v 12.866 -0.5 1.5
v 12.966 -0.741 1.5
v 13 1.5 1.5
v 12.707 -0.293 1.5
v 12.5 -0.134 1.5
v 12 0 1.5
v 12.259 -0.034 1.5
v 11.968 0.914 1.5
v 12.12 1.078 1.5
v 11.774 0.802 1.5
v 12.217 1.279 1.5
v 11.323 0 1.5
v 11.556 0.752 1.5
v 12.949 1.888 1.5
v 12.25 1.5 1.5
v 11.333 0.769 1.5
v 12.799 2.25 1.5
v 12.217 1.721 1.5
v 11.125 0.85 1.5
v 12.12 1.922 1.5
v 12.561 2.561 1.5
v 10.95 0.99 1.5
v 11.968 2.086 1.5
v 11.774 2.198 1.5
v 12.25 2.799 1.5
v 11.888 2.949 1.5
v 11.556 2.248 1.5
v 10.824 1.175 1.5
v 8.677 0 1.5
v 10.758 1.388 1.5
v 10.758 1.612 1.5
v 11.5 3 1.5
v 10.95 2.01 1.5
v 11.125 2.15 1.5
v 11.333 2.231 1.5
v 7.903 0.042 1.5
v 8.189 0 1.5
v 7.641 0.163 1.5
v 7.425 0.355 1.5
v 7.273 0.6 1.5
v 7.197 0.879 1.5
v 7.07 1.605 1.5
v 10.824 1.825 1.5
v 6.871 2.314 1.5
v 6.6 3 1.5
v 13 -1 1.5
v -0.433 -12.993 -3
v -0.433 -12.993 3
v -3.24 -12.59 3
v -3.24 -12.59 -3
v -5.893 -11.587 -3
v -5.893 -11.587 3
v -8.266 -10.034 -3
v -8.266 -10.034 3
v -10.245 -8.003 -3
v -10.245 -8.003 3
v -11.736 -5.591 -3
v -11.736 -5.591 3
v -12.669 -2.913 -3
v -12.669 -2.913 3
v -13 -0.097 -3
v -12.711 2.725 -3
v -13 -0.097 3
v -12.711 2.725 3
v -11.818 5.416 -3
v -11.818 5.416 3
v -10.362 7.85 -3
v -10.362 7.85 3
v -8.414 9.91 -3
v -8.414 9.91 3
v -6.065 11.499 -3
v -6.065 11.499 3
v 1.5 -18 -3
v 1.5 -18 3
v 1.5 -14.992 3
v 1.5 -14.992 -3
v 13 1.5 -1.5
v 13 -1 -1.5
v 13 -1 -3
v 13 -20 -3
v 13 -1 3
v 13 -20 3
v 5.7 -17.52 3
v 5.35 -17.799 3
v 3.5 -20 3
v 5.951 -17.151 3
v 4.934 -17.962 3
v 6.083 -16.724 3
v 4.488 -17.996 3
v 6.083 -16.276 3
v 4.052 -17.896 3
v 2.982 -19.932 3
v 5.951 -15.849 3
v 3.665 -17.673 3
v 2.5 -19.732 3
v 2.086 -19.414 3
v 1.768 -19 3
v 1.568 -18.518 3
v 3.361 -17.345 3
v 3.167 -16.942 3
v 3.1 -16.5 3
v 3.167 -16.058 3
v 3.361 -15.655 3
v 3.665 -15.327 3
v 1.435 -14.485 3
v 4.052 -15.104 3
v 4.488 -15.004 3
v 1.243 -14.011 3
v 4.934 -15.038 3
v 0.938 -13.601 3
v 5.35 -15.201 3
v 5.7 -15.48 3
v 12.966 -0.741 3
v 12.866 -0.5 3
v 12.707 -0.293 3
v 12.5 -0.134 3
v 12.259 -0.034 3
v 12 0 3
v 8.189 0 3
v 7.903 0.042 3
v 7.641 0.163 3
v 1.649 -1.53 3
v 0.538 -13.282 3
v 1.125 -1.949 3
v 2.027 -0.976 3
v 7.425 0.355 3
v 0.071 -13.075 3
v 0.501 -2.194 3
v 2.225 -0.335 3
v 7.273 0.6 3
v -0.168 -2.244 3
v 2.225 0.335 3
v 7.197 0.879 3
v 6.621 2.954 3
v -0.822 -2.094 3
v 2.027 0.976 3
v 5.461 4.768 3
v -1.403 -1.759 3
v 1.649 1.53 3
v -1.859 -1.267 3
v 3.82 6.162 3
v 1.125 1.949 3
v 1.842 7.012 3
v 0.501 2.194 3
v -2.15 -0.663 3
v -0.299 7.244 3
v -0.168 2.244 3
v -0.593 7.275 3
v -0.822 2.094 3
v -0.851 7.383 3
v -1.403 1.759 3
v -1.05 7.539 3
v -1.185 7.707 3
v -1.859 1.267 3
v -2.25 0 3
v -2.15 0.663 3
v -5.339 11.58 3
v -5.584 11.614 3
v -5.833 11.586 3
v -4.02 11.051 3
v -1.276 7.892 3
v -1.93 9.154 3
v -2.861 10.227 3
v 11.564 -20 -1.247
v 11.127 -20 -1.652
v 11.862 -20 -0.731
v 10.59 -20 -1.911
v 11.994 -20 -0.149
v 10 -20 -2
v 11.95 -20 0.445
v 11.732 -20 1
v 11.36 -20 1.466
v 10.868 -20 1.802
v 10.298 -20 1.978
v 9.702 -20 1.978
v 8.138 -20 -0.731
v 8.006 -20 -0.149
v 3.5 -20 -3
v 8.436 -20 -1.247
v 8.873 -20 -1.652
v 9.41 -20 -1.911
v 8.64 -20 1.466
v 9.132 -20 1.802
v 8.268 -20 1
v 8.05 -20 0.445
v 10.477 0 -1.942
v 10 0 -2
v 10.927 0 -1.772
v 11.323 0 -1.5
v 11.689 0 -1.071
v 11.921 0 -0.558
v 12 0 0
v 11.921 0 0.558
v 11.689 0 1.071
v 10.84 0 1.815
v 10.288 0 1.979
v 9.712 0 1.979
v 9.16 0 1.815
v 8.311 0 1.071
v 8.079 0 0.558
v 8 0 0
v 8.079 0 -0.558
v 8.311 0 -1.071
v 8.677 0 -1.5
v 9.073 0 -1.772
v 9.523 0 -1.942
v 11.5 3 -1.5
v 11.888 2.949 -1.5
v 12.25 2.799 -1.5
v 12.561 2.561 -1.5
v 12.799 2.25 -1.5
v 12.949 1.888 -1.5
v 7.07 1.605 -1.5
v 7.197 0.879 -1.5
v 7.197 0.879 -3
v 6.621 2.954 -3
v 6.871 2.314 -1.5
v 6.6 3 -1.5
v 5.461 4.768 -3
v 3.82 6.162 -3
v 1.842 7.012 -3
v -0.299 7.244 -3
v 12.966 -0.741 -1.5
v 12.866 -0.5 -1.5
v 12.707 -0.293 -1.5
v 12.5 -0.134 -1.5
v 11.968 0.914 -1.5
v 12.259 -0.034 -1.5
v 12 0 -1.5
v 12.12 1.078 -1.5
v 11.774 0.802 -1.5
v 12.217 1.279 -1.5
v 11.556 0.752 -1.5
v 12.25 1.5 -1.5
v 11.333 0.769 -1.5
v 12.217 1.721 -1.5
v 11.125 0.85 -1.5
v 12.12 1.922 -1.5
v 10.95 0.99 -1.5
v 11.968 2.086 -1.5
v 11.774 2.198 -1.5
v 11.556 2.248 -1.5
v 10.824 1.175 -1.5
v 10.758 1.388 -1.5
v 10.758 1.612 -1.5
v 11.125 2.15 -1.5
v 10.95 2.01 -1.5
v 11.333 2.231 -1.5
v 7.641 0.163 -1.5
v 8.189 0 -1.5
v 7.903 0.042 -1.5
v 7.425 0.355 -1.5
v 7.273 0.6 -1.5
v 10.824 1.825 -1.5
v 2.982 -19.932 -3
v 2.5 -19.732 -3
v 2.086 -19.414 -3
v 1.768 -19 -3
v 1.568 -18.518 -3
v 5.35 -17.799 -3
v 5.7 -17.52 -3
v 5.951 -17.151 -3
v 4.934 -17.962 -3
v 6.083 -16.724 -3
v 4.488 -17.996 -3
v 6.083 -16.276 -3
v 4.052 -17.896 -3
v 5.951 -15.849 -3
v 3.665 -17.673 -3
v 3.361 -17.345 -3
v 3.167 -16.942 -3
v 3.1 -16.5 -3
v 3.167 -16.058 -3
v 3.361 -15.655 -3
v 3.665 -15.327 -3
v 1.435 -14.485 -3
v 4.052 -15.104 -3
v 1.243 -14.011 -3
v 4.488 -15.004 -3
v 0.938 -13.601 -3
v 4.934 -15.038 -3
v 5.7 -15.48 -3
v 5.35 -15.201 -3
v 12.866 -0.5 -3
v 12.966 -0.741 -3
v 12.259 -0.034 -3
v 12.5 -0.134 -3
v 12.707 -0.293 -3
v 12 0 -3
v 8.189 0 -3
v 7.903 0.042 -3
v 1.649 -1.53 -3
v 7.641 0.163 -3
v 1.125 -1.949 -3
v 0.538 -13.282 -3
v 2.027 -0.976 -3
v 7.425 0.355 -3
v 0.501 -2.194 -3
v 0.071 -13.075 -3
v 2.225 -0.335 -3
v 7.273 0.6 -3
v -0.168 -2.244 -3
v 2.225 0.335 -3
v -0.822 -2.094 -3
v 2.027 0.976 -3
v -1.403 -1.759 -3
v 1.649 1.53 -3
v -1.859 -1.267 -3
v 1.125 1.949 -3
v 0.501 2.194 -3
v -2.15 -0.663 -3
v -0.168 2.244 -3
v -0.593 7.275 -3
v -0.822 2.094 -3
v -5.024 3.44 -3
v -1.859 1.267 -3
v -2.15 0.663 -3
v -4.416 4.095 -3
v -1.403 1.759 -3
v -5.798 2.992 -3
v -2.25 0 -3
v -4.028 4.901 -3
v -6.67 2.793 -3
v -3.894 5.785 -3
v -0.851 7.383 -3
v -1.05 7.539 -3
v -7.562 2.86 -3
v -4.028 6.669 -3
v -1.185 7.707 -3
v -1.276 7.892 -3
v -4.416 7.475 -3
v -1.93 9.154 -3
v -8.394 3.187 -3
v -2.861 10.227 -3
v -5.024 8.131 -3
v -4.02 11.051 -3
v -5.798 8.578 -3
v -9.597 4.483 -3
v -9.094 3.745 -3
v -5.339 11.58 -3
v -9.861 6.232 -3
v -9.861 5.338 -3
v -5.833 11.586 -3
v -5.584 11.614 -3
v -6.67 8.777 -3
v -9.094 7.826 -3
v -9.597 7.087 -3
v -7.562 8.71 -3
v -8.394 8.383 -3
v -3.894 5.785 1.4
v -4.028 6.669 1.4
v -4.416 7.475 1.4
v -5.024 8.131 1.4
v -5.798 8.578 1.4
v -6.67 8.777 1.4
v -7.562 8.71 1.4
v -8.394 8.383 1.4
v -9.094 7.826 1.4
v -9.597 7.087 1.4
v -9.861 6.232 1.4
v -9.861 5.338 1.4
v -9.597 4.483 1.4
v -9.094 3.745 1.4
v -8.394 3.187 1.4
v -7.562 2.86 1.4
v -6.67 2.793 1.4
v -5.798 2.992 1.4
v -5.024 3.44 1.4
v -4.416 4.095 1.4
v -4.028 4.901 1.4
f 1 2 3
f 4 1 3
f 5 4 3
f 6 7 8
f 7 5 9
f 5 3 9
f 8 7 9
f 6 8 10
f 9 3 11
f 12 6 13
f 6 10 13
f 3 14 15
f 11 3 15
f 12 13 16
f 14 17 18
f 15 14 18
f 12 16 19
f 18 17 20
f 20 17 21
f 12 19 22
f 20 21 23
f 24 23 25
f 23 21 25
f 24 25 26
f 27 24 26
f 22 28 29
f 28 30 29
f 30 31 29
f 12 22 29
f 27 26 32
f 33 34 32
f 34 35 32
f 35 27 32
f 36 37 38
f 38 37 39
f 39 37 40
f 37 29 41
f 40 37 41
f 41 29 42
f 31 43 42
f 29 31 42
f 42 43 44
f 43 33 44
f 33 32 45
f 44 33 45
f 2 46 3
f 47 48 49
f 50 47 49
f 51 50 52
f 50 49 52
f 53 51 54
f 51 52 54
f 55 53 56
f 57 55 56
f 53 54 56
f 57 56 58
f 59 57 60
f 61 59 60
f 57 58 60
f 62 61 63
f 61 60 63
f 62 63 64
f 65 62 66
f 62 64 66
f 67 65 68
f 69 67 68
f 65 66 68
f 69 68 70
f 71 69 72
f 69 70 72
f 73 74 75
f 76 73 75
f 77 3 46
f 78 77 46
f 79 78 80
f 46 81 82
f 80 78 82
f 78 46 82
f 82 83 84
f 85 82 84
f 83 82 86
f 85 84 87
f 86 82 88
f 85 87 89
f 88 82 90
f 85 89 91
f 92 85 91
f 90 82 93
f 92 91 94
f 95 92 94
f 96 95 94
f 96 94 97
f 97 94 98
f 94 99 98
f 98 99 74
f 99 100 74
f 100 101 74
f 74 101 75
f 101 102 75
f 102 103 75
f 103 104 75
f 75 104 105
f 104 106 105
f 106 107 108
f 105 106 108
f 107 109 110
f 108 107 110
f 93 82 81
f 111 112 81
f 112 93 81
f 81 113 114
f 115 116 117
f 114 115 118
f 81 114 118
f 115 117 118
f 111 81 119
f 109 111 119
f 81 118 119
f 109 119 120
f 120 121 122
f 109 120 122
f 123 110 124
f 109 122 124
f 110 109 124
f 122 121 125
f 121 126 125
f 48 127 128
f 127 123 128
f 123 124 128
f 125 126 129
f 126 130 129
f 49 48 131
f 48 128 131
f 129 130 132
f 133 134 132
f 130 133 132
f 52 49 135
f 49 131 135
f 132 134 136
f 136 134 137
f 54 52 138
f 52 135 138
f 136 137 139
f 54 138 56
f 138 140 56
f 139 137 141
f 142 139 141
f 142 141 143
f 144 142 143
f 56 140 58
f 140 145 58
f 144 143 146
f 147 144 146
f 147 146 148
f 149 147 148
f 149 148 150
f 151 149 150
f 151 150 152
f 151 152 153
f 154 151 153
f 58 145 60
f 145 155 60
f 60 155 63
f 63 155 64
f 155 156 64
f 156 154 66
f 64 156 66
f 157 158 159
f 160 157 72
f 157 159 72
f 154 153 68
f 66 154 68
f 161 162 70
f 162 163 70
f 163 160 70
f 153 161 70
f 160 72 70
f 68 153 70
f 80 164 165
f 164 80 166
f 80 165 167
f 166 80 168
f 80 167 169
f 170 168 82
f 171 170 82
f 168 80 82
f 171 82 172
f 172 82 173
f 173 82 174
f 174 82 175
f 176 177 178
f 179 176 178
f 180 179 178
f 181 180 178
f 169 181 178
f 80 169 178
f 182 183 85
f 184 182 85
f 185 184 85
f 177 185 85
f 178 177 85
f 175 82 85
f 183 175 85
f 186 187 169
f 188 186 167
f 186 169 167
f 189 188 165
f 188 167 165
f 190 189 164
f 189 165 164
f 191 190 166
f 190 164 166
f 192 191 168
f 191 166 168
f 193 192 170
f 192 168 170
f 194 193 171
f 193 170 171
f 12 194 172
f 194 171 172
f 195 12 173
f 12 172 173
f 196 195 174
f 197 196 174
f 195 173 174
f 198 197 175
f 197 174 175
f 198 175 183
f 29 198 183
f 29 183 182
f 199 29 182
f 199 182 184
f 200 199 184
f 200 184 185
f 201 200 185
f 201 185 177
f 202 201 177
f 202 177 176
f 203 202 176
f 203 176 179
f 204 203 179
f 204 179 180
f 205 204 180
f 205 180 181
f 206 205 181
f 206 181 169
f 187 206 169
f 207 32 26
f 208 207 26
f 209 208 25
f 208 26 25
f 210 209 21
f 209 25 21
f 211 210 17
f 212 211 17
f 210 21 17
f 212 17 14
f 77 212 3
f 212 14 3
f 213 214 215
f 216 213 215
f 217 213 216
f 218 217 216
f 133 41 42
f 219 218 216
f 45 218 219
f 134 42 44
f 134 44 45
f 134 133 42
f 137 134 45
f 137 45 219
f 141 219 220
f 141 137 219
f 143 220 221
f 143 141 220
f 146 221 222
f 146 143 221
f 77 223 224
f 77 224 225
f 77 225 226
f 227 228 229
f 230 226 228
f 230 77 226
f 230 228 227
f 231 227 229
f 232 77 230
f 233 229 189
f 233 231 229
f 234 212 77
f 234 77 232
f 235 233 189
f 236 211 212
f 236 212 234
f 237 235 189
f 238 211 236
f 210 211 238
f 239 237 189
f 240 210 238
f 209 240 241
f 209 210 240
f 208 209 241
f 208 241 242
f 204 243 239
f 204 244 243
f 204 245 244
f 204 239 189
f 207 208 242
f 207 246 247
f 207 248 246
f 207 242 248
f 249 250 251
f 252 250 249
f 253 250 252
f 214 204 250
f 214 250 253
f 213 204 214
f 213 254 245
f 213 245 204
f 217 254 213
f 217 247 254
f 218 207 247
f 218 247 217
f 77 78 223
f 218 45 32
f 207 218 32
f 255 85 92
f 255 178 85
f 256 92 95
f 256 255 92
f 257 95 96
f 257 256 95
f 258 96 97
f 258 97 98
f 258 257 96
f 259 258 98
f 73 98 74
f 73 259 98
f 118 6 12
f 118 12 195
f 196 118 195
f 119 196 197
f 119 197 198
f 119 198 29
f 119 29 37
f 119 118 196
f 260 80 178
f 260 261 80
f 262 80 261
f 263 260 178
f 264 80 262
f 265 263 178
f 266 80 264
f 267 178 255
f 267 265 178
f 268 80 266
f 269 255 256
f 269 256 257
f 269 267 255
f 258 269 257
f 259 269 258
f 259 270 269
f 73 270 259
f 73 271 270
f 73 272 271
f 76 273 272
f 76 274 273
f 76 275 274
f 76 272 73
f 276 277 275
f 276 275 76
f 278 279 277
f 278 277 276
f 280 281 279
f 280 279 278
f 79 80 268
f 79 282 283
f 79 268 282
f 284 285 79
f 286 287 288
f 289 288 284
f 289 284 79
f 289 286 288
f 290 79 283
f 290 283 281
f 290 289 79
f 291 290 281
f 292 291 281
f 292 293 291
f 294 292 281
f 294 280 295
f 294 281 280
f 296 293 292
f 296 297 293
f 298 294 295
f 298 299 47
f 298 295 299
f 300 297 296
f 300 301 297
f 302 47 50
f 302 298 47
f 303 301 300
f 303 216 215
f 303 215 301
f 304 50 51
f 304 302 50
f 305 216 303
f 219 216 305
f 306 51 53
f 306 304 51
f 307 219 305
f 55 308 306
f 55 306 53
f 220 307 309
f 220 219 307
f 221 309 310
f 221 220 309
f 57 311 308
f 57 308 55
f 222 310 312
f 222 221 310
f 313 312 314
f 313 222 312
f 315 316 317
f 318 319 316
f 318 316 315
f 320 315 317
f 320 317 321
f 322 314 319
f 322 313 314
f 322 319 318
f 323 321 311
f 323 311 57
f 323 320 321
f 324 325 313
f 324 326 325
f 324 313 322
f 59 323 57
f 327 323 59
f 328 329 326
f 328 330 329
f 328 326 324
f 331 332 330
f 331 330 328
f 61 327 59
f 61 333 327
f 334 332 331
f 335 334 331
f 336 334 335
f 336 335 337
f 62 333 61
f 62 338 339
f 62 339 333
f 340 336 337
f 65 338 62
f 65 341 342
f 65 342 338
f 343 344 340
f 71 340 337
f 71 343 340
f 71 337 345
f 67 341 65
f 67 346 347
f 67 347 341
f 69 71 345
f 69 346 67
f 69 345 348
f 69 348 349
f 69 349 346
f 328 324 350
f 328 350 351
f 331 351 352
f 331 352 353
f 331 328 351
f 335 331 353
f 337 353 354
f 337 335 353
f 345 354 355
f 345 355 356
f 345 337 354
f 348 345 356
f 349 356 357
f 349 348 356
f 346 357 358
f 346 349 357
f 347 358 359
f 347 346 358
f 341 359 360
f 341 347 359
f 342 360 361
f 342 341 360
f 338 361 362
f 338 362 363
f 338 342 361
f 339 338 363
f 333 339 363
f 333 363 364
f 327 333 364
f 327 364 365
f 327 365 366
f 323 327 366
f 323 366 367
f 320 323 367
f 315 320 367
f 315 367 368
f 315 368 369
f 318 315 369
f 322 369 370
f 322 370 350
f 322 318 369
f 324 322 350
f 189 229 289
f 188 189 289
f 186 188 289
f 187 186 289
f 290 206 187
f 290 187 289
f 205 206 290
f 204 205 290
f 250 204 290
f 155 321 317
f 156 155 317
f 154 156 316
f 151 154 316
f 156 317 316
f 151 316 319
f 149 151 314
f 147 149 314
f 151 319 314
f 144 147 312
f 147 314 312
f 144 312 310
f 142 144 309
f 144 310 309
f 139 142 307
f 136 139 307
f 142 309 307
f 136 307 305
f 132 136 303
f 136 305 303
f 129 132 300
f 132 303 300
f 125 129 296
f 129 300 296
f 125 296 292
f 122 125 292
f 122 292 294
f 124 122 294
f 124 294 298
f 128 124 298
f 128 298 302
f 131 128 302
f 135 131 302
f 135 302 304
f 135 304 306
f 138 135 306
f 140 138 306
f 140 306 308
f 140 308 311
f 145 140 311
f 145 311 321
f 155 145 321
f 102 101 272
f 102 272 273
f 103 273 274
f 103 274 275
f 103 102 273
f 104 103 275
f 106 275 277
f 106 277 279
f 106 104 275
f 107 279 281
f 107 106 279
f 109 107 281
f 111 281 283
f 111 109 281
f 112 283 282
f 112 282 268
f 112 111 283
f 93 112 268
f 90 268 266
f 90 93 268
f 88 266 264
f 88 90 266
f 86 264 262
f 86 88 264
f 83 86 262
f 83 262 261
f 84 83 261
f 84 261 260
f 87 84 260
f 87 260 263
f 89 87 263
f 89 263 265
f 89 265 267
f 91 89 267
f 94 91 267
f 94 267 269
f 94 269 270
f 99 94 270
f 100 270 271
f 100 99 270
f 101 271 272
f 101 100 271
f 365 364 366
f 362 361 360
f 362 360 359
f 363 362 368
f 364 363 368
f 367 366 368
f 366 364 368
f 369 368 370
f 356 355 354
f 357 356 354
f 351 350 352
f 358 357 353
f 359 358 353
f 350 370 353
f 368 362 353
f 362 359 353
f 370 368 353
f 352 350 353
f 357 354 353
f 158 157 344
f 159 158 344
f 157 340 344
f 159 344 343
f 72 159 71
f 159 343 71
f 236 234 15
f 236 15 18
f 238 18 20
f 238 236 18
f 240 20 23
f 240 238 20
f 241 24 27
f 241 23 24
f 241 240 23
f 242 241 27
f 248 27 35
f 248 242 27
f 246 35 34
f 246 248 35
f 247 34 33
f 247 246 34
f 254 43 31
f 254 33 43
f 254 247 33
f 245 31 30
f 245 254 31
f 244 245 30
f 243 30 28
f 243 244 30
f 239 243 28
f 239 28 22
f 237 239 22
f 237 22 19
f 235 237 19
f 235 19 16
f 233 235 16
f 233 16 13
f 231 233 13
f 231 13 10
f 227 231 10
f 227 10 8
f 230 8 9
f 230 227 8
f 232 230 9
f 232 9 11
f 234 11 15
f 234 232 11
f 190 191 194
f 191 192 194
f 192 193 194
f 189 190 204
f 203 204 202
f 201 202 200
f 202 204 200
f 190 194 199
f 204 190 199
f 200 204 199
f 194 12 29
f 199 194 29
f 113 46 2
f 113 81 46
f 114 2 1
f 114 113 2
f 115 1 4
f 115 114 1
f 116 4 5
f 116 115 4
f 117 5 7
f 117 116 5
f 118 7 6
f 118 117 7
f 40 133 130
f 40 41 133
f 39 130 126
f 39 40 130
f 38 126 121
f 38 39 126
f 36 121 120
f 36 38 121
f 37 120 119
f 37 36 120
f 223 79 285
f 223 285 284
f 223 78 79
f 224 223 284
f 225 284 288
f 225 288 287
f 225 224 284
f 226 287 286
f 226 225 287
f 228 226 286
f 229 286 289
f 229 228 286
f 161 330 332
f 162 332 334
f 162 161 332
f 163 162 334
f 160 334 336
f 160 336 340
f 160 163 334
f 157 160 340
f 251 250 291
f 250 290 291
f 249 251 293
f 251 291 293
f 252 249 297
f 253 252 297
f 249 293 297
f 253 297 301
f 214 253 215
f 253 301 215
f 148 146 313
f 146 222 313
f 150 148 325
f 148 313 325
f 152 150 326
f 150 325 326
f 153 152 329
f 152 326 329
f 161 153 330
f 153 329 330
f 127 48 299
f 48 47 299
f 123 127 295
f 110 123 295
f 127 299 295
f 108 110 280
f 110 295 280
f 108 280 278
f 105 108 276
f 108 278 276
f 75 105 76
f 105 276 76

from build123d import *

# Parameters (mm, degrees)
BOSS_EXTRUDE1_DEPTH     = 3
M4_CLEARANCE_HOLE1_D    = 4.5
SKETCH5_R               = 2
CUT_EXTRUDE1_DEPTH      = 20
SKETCH8_R               = 3
CUT_EXTRUDE3_DEPTH      = 4.4
CUT_EXTRUDE4_DEPTH      = 25.596747752
BOSS_EXTRUDE2_DEPTH     = 1.5
FILLET1_R               = 1
CUT_EXTRUDE2_DEPTH      = 25.274472342
CUT_EXTRUDE2_DEPTH_BACK = 25.274472342
SKETCH7_R               = 0.75
BOSS_EXTRUDE3_START     = -6
SKETCH10_R              = 1.5
BOSS_EXTRUDE3_DEPTH     = 6
FILLET3_R               = 2


with BuildPart() as part:
    # Sketch2 → Boss-Extrude1 (new, symmetric)
    with BuildSketch(Plane.XY):
        with BuildLine():
            Line((13, 0), (13, -20))
            Line((13, -20), (7, -20))
            Line((7, -20), (7, -10.95445115))
            ThreePointArc((7, -10.95445115), (-11.401754251, 6.244997998), (13, 0))
        make_face()
    extrude(amount=BOSS_EXTRUDE1_DEPTH, both=True)

    # M4 Clearance Hole1 (through all)
    with Locations(Plane.XY.offset(3)):
        with Locations((0, 0)):
            Hole(M4_CLEARANCE_HOLE1_D / 2)

    # Sketch5 → Cut-Extrude1 (cut)
    with BuildSketch(Plane.XZ.offset(20)):
        with Locations(Location((10, 0, 0), (0, 0, 270))):
            Circle(SKETCH5_R)
    extrude(amount=-CUT_EXTRUDE1_DEPTH, mode=Mode.SUBTRACT)

    # Sketch8 → Cut-Extrude3 (cut)
    with BuildSketch(Plane.XY.offset(-3)):
        with Locations((-6.894399988, 5.785088487)):
            Circle(SKETCH8_R)
    extrude(amount=CUT_EXTRUDE3_DEPTH, mode=Mode.SUBTRACT)

    # Sketch9 → Cut-Extrude4 (cut, through all)
    with BuildSketch(Plane.XY.offset(3)):
        with BuildLine():
            Line((13, 0), (7.25, 0))
            ThreePointArc((7.25, 0), (4.738095767, 5.487526629), (-1.057020278, 7.172531501))
            ThreePointArc((-1.057020278, 7.172531501), (-2.732190546, 10.106663728), (-5.727165906, 11.670457176))
            ThreePointArc((-5.727165906, 11.670457176), (6.875567003, 11.03297686), (13, 0))
        make_face()
    extrude(amount=-CUT_EXTRUDE4_DEPTH, mode=Mode.SUBTRACT)

    # Sketch6 → Boss-Extrude2 (add, symmetric)
    with BuildSketch(Plane.XY):
        with BuildLine():
            Line((13, 1.5), (13, 0))
            Line((13, 0), (7.25, 0))
            ThreePointArc((7.25, 0), (7.085685326, 1.534784498), (6.600189391, 3))
            Line((6.600189391, 3), (11.5, 3))
            ThreePointArc((11.5, 3), (12.560660172, 2.560660172), (13, 1.5))
        make_face()
    extrude(amount=BOSS_EXTRUDE2_DEPTH, both=True)

    # Fillet1
    fillet1_edges = [part.edges().sort_by_distance(p)[0] for p in [
        (-5.727165906, 11.670457176, 0),
        (7.25, 0, -2.25),
        (-1.057020278, 7.172531501, 0),
        (7.25, 0, 2.25),
        (13, 0, -2.25),
        (13, 0, 2.25),
    ]]
    fillet(fillet1_edges, radius=FILLET1_R)

    # Sketch7 → Cut-Extrude2 (cut, two sides: drawn at the far end of the back side and taken through both)
    with BuildSketch(Plane.XY.offset(1.5).offset(-CUT_EXTRUDE2_DEPTH_BACK)):
        with Locations((11.5, 1.5)):
            Circle(SKETCH7_R)
    extrude(amount=CUT_EXTRUDE2_DEPTH + CUT_EXTRUDE2_DEPTH_BACK, mode=Mode.SUBTRACT)

    # Sketch10 → Boss-Extrude3 (add)
    with BuildSketch(Plane(origin=(0, 0, -3), x_dir=(-1, 0, 0), z_dir=(0, 0, -1)).offset(BOSS_EXTRUDE3_START)):
        with BuildLine():
            Line((-7, -10.95445115), (-7, -20))
            Line((-7, -20), (-1.5, -20))
            Line((-1.5, -20), (-1.5, -12.91317157))
            ThreePointArc((-1.5, -12.91317157), (-4.361381252, -12.246564971), (-7, -10.95445115))
        make_face()
        with Locations((-4.6, -16.5)):
            Circle(SKETCH10_R, mode=Mode.SUBTRACT)
    extrude(amount=BOSS_EXTRUDE3_DEPTH)

    # Fillet3
    fillet3_edges = [part.edges().sort_by_distance(p)[0] for p in [
        (1.5, -12.91317157, 0),
        (1.5, -20, 0),
    ]]
    fillet(fillet3_edges, radius=FILLET3_R)


solid = part.part
